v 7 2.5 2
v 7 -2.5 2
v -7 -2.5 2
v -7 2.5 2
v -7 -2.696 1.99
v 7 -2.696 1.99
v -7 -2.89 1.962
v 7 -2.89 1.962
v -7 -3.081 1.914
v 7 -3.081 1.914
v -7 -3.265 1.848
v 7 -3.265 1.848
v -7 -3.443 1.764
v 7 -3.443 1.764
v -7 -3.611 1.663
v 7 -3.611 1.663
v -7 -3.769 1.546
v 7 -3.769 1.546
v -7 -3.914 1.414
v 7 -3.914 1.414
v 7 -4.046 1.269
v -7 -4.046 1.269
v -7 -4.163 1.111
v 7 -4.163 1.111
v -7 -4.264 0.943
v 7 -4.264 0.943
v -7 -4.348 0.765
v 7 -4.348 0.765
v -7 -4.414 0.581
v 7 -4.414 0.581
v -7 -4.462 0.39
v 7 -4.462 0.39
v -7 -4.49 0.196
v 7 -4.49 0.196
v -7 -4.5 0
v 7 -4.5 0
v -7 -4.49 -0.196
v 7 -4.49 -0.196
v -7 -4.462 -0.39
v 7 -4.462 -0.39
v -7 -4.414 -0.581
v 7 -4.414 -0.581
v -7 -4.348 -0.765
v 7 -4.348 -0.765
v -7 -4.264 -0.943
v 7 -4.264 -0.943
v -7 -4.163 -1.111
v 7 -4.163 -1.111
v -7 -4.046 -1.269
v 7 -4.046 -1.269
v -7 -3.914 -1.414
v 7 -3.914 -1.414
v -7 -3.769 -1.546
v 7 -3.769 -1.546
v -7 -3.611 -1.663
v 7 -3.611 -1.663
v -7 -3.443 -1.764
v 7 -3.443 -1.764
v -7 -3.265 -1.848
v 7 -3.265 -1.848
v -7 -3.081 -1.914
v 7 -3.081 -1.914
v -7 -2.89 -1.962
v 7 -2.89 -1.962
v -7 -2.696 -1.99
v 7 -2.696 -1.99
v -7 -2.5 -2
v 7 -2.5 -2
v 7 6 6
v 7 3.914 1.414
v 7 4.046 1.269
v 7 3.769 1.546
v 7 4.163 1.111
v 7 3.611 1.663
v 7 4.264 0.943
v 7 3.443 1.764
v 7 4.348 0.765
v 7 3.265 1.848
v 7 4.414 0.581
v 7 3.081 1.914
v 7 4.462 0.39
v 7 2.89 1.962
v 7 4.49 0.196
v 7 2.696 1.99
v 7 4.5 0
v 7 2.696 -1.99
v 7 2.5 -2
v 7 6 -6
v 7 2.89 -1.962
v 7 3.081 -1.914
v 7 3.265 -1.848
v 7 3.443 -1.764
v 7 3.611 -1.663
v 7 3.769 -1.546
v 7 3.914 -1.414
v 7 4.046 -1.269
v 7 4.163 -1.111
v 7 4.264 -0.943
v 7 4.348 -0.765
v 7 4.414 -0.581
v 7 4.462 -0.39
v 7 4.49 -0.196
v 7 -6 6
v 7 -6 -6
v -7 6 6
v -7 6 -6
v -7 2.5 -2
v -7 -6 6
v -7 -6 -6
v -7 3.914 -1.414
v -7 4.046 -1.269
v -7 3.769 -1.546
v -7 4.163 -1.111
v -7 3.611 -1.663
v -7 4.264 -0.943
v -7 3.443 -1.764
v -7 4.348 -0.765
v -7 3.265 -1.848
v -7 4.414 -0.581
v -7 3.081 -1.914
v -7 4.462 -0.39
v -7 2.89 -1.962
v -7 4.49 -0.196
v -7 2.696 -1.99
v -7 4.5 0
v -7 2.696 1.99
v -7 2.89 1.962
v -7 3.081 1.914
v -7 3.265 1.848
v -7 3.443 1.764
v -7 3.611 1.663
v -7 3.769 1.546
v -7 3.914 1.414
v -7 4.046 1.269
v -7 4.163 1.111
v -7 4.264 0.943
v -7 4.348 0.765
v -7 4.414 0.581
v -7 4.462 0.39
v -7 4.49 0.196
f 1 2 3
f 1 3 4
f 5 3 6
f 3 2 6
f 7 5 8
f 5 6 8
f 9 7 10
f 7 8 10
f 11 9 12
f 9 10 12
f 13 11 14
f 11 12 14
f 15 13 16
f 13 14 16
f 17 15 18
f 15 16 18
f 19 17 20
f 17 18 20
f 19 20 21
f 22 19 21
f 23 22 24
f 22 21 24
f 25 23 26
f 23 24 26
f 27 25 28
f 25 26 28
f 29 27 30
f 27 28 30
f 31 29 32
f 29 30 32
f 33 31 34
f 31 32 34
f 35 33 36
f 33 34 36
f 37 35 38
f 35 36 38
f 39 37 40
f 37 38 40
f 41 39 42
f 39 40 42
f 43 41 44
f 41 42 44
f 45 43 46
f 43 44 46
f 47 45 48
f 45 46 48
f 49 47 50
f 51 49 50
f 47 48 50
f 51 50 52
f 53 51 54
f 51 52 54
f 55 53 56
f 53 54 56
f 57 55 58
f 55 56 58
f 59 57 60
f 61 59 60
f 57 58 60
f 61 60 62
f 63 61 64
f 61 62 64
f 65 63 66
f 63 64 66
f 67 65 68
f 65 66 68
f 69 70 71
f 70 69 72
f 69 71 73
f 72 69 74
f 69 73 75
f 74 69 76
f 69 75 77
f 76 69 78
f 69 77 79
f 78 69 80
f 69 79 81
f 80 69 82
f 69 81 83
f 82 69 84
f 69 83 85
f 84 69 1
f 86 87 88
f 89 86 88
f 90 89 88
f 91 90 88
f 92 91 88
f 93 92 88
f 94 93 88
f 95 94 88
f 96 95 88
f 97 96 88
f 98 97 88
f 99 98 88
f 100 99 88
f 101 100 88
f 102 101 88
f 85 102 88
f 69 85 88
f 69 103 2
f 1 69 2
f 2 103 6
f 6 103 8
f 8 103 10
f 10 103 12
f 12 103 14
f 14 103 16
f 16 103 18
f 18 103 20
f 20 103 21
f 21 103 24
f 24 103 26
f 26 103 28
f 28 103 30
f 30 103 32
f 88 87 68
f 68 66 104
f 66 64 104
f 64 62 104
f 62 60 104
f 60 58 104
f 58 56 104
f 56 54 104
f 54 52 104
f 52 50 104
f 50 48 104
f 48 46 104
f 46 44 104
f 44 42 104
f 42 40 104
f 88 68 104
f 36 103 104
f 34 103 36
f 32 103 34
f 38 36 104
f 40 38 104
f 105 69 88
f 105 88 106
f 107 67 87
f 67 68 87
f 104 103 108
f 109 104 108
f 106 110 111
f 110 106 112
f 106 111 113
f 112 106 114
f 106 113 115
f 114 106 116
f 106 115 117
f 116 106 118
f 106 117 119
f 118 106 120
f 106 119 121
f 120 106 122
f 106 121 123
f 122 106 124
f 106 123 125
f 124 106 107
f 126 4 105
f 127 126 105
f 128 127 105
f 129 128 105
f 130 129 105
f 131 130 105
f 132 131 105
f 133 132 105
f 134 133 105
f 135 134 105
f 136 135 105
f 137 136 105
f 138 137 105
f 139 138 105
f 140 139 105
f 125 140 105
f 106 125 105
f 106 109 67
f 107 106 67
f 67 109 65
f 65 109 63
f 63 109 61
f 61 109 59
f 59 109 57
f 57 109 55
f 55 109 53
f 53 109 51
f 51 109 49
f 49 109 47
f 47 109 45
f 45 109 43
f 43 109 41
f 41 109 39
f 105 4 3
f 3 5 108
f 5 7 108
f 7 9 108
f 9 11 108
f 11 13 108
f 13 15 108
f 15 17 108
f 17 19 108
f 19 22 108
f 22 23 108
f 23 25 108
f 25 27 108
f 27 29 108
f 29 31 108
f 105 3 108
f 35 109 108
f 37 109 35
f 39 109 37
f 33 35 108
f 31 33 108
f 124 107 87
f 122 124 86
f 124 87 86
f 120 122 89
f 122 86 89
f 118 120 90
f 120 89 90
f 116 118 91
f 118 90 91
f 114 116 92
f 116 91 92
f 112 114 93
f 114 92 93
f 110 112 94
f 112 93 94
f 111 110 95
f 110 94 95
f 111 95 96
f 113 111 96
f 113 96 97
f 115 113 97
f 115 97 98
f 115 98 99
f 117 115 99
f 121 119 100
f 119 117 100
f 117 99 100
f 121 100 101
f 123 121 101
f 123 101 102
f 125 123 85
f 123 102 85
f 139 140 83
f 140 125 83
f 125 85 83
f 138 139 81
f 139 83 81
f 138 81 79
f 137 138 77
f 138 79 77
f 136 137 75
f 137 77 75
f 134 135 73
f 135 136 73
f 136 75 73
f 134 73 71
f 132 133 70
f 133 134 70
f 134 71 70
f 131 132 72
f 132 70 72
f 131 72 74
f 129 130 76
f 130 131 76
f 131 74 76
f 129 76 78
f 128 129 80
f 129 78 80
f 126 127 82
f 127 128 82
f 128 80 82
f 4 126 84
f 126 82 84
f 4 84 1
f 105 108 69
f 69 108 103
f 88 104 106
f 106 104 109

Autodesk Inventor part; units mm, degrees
ref_plane "YZ Plane" through (0, 0, 0) normal (1, 0, 0) x (0, 1, 0)
ref_plane "XZ Plane" through (0, 0, 0) normal (0, 1, 0) x (-1, 0, 0)
ref_plane "XY Plane" through (0, 0, 0) normal (0, 0, 1) x (1, 0, 0)
sketch "스케치1" plane through (0, 0, 0) normal (0, 1, 0) x (-1, 0, 0)
  line L0 (7, 6) -> (-7, 6)
  line L1 (-7, 6) -> (-7, -6)
  line L2 (-7, -6) -> (7, -6)
  line L3 (7, -6) -> (7, 6)
  line L4 (7, 6) -> (-7, -6) construction
  line L5 (-7, 6) -> (7, -6) construction
  point P0 (0, 0)
  dimension "d0" = 14
  dimension "d1" = 12
extrude "돌출1" add sketch "스케치1" along normal mid plane 12
sketch "스케치3" plane through (7, -6, -6) normal (1, 0, 0) x (0, 0, -1)
  line L0 (-14.9639, 6) -> (4.1102, 6) construction
  line L1 (-6, -0.8058) -> (-6, 13.755)
  line L2 (-12, 12) -> (0, 12) projected
  line L3 (-14.4911, 8.5) -> (7.0888, 8.5)
  arc A0 (-4, 8.5) -> (-8, 8.5) centre (-6, 8.5) ccw
  arc A1 (-8, 3.5) -> (-4, 3.5) centre (-6, 3.5) ccw
  line L4 (-8, 3.5) -> (-8, 8.5)
  line L5 (-4, 3.5) -> (-4, 8.5)
  point P0 (-6, 6)
  dimension "d8" = 6
  dimension "d9" = 5
  dimension "d10" = 4
extrude "돌출2" cut sketch "스케치3" against normal up to surface (14 mm away)
properties part number "multiblock_12x12x14" material "폴리스티렌"
